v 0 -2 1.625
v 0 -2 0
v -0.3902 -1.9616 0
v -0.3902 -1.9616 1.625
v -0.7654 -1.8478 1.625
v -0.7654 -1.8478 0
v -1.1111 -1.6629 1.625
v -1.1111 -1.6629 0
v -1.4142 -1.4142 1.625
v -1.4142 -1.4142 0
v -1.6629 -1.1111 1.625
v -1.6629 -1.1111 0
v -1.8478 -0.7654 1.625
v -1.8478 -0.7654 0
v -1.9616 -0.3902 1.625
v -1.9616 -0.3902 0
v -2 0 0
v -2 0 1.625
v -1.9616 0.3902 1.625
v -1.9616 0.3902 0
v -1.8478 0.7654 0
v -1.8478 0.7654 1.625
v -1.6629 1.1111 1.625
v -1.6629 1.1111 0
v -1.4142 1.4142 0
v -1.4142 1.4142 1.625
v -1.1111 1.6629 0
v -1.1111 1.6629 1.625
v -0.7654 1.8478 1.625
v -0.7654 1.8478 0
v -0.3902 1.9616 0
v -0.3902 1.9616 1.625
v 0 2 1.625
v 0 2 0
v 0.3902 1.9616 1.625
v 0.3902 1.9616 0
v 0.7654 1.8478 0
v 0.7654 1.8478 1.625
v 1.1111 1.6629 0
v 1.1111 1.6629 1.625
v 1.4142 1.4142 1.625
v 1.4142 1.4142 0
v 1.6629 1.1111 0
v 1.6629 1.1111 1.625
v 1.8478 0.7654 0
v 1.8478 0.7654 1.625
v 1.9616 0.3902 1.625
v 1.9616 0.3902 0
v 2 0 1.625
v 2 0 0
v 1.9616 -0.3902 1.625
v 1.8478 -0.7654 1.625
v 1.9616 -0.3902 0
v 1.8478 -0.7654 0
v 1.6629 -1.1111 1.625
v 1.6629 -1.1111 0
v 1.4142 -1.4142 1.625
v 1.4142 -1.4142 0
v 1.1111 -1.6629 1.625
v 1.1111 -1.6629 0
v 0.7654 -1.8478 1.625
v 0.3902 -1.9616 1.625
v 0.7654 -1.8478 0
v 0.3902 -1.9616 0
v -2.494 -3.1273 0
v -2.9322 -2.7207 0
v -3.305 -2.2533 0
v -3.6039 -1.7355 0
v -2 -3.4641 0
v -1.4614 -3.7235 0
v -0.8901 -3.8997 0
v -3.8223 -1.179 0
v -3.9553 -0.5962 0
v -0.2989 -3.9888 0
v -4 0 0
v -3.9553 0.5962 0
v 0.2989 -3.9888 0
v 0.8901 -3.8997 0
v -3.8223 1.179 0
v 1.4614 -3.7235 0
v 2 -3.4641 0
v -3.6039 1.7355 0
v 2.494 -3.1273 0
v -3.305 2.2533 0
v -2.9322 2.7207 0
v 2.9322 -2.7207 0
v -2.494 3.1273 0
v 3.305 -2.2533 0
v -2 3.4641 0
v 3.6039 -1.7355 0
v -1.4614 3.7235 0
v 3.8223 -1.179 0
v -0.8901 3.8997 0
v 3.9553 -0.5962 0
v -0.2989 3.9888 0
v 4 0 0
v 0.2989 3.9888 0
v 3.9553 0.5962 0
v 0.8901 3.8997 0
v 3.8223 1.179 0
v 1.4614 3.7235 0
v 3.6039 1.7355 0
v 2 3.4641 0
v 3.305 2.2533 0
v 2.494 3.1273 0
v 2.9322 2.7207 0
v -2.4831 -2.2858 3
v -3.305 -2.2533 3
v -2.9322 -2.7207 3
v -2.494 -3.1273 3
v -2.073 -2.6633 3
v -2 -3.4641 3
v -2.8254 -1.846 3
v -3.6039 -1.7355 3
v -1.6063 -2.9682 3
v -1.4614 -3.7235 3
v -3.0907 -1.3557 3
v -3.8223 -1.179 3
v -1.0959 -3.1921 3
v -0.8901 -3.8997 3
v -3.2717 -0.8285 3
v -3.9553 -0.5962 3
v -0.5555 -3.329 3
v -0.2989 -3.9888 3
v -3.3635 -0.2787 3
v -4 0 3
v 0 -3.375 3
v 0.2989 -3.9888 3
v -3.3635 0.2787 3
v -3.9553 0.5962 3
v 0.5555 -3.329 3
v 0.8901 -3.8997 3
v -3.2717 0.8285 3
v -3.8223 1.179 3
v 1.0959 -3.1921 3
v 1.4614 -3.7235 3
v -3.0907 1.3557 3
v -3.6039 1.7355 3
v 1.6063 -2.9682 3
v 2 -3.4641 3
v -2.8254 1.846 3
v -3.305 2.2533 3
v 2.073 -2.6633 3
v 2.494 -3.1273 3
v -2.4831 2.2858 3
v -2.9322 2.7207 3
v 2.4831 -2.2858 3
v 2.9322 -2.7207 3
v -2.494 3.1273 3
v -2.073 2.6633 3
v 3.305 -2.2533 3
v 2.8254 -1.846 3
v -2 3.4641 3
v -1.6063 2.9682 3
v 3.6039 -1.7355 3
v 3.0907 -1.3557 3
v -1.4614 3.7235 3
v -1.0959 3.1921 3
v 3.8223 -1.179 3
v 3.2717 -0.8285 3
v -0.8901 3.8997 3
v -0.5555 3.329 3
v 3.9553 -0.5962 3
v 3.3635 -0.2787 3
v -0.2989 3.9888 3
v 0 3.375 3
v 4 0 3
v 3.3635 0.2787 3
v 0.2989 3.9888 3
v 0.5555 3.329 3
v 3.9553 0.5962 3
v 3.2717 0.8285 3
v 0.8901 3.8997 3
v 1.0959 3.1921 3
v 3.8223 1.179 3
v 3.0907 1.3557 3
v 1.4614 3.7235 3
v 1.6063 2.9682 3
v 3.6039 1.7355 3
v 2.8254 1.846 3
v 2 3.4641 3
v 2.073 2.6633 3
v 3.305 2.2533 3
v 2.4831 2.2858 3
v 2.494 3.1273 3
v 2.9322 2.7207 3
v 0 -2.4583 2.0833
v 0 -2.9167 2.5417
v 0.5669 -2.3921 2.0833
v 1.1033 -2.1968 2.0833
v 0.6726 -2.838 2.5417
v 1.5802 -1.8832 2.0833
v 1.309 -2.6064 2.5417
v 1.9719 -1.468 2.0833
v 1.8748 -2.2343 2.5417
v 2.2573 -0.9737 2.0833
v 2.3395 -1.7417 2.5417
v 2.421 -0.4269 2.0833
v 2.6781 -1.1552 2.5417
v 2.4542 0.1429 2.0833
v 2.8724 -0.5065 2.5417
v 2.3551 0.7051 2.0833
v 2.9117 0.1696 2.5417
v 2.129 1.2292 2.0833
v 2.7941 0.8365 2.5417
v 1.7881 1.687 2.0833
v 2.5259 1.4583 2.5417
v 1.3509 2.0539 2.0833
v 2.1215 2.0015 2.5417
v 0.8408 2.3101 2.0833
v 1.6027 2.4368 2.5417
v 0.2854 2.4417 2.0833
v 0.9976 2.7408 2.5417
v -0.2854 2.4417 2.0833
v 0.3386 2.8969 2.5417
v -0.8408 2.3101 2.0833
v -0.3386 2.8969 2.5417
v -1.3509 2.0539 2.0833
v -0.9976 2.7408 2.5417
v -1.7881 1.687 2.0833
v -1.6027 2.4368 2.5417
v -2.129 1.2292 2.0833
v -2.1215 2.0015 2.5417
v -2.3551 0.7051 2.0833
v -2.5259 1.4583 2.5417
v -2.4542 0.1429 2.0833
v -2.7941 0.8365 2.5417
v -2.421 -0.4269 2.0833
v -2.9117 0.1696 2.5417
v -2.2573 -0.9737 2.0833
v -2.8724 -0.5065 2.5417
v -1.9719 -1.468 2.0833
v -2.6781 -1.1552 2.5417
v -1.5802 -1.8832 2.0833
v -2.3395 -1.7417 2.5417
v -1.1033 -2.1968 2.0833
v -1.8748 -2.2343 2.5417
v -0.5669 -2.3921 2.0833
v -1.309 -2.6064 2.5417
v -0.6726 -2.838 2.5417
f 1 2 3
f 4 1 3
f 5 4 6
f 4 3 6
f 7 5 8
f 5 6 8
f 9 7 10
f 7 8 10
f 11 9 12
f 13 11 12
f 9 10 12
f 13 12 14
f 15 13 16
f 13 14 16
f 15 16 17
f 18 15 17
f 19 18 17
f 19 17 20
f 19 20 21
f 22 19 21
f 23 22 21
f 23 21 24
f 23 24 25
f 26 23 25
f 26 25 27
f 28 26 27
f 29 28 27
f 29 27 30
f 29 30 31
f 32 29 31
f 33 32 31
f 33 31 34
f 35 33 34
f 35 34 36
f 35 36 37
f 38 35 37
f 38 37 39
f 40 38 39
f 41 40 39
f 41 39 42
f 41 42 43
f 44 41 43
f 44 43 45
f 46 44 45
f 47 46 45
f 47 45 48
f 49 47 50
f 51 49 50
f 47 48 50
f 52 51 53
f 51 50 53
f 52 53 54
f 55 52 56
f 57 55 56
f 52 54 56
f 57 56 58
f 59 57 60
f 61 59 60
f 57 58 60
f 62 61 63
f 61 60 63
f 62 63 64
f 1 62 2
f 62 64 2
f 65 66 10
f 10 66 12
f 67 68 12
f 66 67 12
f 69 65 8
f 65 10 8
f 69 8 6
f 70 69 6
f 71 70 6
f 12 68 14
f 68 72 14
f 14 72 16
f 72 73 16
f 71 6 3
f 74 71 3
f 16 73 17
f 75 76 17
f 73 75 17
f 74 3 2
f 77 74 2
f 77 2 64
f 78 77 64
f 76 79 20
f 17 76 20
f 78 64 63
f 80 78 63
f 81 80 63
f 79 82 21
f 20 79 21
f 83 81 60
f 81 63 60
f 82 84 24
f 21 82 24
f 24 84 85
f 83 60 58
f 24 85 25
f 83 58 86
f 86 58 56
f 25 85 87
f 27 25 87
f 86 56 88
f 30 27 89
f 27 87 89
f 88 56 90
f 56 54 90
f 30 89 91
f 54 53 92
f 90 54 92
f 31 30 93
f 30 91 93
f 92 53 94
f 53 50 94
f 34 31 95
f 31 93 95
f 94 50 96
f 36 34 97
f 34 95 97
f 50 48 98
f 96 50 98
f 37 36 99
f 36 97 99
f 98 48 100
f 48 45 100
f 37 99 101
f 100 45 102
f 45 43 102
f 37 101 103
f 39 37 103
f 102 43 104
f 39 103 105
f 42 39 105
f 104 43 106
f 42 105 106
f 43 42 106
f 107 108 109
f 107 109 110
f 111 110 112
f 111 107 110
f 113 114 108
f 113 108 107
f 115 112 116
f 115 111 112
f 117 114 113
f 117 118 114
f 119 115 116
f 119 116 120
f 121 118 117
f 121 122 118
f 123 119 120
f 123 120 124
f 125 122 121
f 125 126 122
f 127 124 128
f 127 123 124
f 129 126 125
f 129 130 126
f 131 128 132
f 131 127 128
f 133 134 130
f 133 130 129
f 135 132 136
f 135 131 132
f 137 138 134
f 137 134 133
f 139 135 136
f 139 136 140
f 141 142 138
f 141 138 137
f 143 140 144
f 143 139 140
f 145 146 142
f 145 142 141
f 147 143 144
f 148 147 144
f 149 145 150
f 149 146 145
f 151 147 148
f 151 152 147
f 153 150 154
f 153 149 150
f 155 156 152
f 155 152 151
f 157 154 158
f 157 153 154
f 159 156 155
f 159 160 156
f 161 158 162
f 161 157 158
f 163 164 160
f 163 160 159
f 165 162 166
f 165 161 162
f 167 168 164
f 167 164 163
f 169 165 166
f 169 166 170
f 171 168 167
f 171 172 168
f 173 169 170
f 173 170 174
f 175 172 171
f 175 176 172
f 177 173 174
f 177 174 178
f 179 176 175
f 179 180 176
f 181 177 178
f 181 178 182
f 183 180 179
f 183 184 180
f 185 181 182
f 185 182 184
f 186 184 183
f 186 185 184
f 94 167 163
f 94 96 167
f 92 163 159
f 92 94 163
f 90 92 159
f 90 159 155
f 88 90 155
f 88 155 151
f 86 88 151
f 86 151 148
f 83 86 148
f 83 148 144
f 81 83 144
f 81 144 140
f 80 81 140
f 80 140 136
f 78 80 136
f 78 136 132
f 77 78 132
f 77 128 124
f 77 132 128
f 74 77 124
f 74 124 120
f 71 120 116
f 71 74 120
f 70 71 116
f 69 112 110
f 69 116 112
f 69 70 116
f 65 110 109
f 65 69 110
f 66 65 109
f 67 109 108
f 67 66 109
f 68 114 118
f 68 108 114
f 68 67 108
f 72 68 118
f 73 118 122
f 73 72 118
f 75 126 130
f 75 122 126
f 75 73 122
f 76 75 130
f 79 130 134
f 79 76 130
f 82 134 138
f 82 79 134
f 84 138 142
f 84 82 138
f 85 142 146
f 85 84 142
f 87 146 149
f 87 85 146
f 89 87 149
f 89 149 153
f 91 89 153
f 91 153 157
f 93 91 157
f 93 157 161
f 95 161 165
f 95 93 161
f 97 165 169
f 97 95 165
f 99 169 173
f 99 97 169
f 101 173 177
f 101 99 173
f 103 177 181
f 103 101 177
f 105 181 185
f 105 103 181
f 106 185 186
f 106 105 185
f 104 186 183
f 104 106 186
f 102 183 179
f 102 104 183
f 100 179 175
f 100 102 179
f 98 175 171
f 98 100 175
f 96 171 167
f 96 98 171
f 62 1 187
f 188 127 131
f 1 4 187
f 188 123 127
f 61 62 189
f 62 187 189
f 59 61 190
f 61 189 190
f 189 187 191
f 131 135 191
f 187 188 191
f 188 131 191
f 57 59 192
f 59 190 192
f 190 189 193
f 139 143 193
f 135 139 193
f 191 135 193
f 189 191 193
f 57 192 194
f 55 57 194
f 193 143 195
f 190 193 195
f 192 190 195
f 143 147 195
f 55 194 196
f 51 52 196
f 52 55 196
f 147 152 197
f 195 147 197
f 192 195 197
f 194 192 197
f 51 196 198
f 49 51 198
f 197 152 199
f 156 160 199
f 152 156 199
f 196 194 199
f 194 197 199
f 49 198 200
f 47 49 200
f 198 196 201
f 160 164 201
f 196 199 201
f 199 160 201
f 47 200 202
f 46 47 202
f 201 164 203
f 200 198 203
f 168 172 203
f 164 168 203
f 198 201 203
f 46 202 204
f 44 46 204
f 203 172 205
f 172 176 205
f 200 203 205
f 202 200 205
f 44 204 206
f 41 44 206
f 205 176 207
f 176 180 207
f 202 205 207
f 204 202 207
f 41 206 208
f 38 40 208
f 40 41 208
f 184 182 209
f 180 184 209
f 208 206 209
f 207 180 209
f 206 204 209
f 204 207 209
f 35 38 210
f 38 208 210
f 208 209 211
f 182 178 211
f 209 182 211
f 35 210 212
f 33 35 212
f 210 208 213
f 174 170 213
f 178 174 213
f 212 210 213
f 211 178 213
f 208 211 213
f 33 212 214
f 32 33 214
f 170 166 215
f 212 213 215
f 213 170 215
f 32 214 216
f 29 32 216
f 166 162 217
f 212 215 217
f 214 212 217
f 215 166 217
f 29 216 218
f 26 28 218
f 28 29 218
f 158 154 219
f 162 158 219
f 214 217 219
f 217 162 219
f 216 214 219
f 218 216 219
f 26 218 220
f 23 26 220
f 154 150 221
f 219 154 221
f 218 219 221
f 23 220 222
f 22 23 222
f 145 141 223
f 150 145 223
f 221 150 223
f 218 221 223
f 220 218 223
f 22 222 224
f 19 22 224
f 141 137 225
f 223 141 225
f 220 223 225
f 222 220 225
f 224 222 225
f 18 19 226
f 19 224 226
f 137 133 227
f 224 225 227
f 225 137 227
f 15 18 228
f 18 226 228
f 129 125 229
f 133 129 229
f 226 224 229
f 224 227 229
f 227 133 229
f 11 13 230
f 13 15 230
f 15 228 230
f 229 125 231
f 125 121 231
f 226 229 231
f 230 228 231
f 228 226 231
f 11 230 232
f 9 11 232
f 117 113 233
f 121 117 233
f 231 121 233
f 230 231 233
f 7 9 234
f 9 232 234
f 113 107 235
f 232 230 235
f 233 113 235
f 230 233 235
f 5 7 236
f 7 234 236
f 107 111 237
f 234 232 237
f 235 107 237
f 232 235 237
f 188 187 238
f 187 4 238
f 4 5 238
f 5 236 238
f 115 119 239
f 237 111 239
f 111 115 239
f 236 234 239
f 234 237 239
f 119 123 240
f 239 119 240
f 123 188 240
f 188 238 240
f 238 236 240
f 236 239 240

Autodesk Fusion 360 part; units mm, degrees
sketch "Sketch1" plane through (0, 0, 0) normal (0, 0, 1) x (1, 0, 0)
  circle A0 centre (0, 0) radius 3.5
  circle A1 centre (0, 0) radius 1.6
  dimension "d1" = 7
  dimension "d2" = 3.2
extrude "Extrude1" add sketch "Sketch1" along normal blind 0.5

Autodesk Fusion 360 part; units mm, degrees
sketch "Sketch1" plane through (0, 0, 0) normal (0, 0, 1) x (1, 0, 0)
  circle A0 centre (0, 0) radius 4
  dimension "d1" = 8
extrude "Extrude1" add sketch "Sketch1" along normal blind 3
hole "Hole1" at (0, 0, 3) direction (0, 0, -1) diameter 4 end through all countersink diameter 6.75 countersink angle 90
